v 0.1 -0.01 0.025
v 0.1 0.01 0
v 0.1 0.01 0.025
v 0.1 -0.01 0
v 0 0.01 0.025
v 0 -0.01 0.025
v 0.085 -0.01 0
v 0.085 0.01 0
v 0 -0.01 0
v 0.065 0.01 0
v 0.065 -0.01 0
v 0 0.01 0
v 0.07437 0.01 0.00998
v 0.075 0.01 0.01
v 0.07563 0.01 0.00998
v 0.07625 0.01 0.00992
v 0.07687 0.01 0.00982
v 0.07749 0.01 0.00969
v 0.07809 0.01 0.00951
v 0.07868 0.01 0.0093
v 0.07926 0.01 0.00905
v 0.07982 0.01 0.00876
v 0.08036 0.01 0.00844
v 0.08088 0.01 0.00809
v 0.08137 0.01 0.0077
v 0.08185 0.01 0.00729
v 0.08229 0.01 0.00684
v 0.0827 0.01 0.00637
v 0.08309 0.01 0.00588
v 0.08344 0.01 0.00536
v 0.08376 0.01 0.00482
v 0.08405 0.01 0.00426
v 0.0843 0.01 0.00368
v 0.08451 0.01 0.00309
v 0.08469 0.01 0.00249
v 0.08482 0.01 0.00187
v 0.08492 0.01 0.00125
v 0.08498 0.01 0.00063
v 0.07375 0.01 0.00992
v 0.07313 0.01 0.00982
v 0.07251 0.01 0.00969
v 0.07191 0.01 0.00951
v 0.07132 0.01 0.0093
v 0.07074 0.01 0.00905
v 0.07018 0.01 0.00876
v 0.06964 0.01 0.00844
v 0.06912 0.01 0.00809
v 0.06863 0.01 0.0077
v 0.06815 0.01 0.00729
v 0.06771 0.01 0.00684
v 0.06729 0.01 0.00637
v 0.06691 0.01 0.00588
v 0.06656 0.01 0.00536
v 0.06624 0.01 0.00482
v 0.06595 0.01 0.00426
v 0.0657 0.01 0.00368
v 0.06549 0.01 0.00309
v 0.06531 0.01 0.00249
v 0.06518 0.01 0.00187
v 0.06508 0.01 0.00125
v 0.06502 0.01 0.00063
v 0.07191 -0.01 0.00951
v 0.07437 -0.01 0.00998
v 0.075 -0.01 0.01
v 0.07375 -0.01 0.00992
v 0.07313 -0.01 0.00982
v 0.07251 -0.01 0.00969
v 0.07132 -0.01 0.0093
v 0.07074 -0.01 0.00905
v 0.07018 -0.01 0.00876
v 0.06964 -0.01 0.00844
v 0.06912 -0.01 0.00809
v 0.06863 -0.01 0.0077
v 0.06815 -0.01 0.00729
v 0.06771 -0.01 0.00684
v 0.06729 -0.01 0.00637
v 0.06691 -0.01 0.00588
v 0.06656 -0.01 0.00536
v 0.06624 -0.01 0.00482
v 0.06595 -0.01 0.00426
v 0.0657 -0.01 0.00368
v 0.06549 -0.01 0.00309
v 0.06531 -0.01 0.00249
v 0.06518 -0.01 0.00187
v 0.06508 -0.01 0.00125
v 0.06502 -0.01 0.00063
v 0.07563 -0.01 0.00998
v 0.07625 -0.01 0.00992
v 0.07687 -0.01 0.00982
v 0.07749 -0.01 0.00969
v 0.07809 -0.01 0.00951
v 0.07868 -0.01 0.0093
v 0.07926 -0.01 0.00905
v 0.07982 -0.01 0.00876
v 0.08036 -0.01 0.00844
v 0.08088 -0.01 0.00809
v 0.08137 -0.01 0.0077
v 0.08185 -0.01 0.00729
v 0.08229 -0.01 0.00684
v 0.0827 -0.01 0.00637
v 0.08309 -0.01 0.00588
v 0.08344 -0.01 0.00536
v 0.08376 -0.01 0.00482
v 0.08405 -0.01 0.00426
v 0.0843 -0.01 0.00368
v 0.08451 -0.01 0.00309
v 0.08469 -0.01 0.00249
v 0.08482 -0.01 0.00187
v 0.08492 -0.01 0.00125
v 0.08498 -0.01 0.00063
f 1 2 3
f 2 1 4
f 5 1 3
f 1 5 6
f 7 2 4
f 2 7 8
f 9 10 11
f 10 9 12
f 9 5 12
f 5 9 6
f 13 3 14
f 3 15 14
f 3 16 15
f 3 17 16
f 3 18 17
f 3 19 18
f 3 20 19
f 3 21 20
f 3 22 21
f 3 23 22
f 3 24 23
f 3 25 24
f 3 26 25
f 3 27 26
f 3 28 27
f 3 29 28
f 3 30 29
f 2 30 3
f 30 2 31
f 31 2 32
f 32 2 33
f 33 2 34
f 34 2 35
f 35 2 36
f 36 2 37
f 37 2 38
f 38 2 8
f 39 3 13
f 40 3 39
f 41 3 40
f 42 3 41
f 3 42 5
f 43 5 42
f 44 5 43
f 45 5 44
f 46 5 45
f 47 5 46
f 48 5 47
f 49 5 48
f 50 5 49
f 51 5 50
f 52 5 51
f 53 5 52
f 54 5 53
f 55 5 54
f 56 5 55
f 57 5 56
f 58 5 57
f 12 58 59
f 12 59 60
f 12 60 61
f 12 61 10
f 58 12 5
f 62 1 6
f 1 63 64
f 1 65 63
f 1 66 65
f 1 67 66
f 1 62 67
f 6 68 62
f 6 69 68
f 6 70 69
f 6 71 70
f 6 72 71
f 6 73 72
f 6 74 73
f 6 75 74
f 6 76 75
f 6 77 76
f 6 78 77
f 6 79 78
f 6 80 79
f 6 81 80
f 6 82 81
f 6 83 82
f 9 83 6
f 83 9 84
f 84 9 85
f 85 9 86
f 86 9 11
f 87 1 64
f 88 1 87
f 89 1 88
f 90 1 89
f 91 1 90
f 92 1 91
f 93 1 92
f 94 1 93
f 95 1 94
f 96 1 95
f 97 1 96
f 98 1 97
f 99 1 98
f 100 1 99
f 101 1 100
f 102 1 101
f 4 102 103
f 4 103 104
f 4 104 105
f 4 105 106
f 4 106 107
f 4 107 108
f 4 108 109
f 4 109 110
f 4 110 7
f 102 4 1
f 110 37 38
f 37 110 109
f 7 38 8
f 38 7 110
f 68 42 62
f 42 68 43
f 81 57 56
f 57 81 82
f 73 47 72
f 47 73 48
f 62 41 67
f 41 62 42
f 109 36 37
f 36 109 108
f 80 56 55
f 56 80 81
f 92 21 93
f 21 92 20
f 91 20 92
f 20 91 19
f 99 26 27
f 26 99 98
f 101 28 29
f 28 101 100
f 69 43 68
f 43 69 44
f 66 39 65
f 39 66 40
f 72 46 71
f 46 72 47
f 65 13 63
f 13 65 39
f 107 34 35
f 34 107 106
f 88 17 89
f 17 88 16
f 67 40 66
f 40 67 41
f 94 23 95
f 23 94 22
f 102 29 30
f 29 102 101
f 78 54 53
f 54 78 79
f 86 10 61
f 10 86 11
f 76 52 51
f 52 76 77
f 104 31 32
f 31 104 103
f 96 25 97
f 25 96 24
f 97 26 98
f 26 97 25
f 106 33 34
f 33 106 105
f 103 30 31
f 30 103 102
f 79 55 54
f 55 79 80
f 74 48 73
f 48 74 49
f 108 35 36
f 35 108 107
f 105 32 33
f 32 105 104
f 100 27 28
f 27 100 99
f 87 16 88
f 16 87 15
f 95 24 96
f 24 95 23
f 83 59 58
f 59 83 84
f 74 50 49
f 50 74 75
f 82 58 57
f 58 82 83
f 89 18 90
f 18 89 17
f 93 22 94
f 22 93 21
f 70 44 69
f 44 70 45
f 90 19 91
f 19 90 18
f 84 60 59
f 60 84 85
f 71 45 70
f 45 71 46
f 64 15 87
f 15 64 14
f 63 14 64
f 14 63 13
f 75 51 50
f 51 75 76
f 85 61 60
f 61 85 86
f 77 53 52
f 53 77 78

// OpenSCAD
s = 1;

length = 0.1;
width = 0.025;
depth = 0.020;
chfdepth = 0;
chfangle = 45;
cutpos = 0.075;
cutdepth = 0.01;
cutangle = 90;
cuttilt = 0;

/* Produces basic box finger */
module basicShape(length, width, depth)
{
	translate([0, -depth/2, 0]) cube([length, depth, width]);
}

/* Produces the chamfering geometry.
 * length -- length of the finger
 * start_depth -- distance from the finger plane at which the chamfer starts
 * angle --- chamfering angle
 */
module chamfering(length, start_depth, angle) {
	size = 1000;

	translate([length, 0, start_depth])
		rotate([0, 90-angle, 0])
			translate([0, 0, size/2])
				cube(size, center = true);
}

/* Produces the geometry for the cutout.
 * cutpos -- position of the cutout
 * cutdepth -- depth of the cutout
 * cutangle -- the angle of the cutout
 * cuttilt -- the tilt of the cutout
 */
module cutout(cutpos, cutdepth, cutangle, cuttilt) {
	size = 1000;

	s_x = tan(cutangle /2);

	translate([cutpos, 0, 0])
		rotate([0, 0, cuttilt])
			rotate([90, 0, 0])
				translate([0, 0, 0])
					scale([s_x, 1, 1])
						cylinder(h = size, r = cutdepth, center = true, $fn = 100);
}

/* Produces the finger geometry.
 * Parameters...
 */
module finger(length, width, depth, chfdepth, chfangle, cutpos, cutdepth, cutangle, cuttilt) {
	difference() {
		difference() {
			basicShape(length, width, depth);
			chamfering(length, width - width * chfdepth, chfangle);
		}
		cutout(cutpos, cutdepth, cutangle, cuttilt);
	}
}

scale(s)
	finger(length, width, depth, chfdepth, chfangle, cutpos, cutdepth, cutangle, cuttilt);
